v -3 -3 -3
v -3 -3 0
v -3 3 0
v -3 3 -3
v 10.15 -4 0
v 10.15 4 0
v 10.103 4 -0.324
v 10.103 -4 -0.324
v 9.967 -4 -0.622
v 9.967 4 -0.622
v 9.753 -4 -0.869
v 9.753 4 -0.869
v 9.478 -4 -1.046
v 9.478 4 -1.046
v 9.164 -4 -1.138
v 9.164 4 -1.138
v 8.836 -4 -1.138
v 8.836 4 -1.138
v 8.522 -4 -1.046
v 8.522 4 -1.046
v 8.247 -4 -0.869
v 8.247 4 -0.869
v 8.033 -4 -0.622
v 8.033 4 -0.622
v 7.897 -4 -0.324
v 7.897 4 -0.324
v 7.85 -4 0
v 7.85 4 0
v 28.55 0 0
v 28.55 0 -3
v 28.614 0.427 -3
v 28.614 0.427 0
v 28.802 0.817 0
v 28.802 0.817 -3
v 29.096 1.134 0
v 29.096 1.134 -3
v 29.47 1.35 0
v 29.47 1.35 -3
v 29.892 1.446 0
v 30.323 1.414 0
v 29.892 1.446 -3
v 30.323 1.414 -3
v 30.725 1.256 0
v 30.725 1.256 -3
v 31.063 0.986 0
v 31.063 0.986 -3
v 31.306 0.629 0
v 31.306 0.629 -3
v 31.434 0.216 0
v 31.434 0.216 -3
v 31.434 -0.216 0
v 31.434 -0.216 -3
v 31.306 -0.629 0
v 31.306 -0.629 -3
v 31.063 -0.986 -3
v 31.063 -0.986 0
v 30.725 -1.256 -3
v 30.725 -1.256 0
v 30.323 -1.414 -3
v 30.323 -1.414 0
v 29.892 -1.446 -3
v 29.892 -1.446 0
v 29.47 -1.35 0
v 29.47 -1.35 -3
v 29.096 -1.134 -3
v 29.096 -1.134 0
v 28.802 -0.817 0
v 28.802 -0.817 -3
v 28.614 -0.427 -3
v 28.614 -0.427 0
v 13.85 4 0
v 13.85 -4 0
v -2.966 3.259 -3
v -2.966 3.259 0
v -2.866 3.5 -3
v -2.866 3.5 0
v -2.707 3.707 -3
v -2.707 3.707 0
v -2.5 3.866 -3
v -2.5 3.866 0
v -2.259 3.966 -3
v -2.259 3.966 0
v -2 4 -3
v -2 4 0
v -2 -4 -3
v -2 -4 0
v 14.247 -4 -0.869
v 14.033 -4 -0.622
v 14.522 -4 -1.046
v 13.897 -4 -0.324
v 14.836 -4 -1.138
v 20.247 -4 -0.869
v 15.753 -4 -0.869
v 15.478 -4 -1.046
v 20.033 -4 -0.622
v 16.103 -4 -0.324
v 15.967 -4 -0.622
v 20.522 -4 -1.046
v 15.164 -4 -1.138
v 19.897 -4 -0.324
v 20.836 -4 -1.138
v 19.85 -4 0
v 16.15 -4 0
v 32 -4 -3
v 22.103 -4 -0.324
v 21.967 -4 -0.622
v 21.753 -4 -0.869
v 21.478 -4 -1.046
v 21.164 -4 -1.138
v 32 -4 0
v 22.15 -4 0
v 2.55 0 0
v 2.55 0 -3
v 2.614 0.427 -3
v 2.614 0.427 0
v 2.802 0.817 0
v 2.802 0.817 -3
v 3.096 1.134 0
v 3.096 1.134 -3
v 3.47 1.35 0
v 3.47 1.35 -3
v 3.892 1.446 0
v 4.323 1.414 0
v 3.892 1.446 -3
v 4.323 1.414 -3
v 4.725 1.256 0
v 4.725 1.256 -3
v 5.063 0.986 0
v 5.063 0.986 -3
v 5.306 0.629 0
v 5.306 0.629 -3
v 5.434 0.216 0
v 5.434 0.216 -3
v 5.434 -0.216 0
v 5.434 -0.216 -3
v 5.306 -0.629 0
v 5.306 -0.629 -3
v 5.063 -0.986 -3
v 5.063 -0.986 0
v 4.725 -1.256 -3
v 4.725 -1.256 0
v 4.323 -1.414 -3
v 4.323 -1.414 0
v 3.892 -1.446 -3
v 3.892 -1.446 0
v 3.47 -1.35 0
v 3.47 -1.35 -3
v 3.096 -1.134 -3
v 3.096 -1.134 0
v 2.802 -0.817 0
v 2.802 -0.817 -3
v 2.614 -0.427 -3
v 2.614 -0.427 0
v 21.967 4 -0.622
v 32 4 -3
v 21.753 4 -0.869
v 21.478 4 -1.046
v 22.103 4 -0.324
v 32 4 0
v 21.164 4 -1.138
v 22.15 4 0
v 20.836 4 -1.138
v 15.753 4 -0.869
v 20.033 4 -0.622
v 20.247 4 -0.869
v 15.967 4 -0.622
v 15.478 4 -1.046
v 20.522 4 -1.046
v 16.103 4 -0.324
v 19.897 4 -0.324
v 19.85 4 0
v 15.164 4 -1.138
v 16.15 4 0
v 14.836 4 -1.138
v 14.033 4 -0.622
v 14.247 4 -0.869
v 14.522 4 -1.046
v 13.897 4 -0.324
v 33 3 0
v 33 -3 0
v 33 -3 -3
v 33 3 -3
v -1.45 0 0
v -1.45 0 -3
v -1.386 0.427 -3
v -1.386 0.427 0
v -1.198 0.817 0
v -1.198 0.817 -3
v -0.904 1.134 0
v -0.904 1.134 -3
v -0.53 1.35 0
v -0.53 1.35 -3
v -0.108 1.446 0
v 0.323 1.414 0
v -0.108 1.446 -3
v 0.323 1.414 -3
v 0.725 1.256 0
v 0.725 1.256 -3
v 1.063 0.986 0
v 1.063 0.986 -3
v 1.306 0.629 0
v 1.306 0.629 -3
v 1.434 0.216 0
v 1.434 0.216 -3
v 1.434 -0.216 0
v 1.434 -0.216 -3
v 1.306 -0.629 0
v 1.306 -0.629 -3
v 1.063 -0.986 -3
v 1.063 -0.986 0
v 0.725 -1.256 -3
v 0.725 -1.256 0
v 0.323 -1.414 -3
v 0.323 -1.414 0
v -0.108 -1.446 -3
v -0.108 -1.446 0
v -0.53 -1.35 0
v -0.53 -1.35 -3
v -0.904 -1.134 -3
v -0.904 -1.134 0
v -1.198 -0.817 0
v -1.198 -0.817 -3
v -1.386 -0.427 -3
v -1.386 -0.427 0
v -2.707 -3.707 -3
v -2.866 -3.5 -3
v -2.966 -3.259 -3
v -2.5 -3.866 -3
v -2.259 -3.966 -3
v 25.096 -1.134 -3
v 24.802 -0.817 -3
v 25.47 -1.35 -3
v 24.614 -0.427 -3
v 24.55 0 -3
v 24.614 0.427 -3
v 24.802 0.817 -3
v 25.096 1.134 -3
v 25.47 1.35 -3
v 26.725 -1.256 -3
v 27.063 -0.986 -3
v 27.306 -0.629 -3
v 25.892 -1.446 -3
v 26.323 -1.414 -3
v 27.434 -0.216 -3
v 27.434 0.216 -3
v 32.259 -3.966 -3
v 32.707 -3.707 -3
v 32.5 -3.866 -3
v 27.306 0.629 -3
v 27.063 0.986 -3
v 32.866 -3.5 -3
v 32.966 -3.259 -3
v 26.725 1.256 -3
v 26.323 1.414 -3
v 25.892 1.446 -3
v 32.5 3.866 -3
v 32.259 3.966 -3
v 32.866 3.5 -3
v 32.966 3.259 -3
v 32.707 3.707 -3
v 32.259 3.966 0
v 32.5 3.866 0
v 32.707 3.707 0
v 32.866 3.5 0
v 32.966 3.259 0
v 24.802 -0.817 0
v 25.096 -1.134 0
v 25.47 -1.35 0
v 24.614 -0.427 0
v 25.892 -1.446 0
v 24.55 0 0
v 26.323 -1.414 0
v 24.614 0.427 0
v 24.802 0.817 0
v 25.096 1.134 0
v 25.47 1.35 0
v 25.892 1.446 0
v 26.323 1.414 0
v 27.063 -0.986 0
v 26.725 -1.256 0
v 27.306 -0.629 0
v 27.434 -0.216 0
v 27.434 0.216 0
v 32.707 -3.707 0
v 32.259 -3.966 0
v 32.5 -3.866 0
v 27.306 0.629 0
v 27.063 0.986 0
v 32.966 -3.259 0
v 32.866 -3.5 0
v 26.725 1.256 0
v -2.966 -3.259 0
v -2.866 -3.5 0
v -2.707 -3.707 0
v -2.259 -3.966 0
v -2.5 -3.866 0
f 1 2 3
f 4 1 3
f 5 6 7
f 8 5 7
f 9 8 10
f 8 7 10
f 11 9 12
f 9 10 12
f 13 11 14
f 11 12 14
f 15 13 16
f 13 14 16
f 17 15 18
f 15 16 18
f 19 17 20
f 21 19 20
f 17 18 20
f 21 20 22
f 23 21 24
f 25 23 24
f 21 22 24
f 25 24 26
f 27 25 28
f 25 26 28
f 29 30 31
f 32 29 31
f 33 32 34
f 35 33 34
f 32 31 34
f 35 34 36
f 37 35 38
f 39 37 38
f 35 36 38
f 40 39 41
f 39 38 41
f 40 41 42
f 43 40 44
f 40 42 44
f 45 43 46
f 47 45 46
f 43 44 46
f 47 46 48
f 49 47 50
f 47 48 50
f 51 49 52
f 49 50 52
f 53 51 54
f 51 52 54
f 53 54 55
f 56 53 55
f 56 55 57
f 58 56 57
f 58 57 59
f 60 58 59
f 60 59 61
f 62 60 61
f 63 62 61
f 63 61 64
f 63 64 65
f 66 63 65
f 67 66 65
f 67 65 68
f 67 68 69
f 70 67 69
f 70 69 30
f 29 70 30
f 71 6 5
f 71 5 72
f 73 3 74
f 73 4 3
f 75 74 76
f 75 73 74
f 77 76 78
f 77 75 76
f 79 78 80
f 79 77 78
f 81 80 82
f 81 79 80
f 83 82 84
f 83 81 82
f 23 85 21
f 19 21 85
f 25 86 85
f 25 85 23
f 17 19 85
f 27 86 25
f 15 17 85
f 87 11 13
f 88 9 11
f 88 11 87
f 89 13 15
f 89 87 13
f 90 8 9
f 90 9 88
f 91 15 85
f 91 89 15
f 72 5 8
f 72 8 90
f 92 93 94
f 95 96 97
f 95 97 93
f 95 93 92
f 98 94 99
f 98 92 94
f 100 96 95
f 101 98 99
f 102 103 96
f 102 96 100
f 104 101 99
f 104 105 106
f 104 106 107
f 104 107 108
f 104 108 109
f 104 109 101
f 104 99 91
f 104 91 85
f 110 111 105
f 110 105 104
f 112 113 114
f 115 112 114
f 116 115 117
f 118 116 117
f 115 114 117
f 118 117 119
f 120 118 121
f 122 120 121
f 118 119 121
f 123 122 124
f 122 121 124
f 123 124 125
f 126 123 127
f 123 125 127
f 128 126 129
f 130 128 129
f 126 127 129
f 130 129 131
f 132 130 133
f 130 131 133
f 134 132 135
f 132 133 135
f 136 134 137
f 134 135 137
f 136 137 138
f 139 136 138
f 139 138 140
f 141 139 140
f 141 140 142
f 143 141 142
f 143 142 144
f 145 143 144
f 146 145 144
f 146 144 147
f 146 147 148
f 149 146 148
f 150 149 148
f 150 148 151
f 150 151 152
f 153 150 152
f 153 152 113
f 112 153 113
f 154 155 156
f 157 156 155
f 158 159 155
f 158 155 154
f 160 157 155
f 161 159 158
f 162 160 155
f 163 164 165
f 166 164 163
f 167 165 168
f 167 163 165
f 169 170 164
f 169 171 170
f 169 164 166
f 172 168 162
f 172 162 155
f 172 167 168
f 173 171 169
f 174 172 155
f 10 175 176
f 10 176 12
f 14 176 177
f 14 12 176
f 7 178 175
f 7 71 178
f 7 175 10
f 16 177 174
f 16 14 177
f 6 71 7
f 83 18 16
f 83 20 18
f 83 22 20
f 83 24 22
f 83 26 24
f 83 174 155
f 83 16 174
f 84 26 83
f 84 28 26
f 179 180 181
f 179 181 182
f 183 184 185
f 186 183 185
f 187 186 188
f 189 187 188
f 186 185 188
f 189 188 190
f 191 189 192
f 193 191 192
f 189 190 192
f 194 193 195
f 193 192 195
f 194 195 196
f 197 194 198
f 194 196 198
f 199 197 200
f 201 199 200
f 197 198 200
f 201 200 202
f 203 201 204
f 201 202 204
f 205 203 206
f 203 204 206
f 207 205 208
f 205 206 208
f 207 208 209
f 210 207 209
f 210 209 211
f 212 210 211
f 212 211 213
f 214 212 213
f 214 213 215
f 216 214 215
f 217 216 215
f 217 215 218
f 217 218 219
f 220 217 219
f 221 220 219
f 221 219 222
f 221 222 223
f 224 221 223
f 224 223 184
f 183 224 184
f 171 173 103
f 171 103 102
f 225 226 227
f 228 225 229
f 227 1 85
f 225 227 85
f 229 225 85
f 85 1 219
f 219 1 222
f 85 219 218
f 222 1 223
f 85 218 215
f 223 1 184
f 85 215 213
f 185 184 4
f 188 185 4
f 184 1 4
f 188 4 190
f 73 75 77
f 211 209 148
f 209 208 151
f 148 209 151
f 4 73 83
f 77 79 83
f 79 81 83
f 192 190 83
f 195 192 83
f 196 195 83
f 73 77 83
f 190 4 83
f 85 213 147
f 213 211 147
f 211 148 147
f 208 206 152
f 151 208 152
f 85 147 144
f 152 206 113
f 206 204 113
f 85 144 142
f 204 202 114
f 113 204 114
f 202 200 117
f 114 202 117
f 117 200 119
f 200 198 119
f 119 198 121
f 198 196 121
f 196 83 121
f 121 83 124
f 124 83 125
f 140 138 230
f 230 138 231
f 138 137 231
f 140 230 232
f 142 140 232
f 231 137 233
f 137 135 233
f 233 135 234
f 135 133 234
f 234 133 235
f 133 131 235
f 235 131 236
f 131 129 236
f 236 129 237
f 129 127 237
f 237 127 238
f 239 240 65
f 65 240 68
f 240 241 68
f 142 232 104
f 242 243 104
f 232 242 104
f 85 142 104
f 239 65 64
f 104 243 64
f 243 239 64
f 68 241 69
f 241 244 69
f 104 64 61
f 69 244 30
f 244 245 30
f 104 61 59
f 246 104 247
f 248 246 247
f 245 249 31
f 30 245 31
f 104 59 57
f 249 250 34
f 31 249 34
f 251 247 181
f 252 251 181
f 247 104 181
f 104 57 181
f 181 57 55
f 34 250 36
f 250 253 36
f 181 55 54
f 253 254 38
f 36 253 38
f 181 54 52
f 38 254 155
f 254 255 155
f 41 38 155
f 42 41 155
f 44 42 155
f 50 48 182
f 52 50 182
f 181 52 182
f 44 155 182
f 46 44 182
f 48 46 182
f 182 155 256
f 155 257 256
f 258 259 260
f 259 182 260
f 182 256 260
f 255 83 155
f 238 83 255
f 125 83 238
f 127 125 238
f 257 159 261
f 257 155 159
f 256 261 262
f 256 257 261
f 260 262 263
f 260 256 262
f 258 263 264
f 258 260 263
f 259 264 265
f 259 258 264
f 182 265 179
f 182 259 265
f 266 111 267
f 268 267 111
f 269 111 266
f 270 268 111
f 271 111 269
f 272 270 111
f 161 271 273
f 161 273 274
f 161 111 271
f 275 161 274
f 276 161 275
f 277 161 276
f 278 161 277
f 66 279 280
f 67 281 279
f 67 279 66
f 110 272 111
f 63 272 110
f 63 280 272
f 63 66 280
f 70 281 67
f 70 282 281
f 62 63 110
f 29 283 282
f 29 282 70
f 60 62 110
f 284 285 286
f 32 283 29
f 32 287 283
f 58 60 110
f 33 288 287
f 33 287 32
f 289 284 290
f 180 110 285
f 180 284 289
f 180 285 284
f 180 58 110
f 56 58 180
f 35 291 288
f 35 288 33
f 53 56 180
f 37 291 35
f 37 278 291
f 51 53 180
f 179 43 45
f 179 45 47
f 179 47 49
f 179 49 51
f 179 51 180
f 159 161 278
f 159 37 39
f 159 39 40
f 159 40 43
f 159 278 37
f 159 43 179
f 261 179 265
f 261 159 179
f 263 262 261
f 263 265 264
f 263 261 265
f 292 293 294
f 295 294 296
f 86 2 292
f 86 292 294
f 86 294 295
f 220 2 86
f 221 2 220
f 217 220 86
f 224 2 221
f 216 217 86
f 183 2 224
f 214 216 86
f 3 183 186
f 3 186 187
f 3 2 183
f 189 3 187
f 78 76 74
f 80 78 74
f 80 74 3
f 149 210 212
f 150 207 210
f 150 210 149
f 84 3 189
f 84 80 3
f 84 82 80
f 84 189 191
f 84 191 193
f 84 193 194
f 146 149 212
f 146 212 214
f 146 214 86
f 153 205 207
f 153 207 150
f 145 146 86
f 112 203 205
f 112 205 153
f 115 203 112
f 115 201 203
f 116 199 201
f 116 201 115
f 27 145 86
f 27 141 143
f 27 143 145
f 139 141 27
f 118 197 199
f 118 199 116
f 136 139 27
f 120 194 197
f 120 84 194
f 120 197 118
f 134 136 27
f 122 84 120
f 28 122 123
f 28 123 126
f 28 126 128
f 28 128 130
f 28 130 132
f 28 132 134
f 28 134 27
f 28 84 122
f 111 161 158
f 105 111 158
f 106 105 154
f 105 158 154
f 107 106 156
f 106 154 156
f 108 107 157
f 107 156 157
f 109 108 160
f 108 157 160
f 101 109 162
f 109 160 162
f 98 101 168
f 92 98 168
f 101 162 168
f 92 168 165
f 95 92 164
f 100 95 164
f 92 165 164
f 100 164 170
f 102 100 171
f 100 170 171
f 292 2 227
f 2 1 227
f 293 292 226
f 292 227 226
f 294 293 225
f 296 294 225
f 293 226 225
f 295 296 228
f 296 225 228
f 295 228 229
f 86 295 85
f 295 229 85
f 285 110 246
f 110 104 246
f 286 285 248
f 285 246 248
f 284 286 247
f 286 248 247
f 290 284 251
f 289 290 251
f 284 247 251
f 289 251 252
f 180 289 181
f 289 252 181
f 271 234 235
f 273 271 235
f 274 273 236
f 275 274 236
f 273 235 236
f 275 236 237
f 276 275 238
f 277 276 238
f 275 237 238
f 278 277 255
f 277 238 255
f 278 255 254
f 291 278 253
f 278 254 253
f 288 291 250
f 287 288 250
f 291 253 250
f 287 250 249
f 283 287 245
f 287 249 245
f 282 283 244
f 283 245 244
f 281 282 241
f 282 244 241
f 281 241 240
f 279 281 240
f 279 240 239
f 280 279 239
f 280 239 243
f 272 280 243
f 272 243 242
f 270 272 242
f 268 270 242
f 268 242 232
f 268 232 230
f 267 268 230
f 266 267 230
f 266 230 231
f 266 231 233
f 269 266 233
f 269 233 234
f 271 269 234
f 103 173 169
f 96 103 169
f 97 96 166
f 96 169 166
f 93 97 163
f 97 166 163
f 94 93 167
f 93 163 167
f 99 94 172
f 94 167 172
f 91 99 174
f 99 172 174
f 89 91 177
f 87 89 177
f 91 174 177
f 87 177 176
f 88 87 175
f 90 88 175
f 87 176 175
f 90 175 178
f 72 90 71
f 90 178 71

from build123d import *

# Parameters (mm, degrees)
F0_W     = 6
F0_H     = 8
F0_W_2   = 24
F1_DEPTH = 3
F2_D     = 2.9
F4_D     = 2.3
F5_R     = 1


with BuildPart() as f1:
    # F0 (on Top) → F1 (new body)
    with BuildSketch(Plane.XY):
        Rectangle(F0_W, F0_H)
        with Locations((15, 0)):
            Rectangle(F0_W_2, F0_H)
        with Locations((30, 0)):
            Rectangle(F0_W, F0_H)
    extrude(amount=-F1_DEPTH)

    # F2 (through all)
    with Locations(Plane.XY):
        with Locations((0, 0), (4, 0), (26, 0), (30, 0)):
            Hole(F2_D / 2)

    # F4 (through all)
    with Locations(Plane.XZ.offset(4)):
        with Locations((9, 0), (21, 0), (15, 0)):
            Hole(F4_D / 2)

    # F5
    f5_edges = [f1.edges().sort_by_distance(p)[0] for p in [
        (-3, -4, -1.5),
        (33, -4, -1.5),
        (33, 4, -1.5),
        (-3, 4, -1.5),
    ]]
    fillet(f5_edges, radius=F5_R)


solid = f1.part
